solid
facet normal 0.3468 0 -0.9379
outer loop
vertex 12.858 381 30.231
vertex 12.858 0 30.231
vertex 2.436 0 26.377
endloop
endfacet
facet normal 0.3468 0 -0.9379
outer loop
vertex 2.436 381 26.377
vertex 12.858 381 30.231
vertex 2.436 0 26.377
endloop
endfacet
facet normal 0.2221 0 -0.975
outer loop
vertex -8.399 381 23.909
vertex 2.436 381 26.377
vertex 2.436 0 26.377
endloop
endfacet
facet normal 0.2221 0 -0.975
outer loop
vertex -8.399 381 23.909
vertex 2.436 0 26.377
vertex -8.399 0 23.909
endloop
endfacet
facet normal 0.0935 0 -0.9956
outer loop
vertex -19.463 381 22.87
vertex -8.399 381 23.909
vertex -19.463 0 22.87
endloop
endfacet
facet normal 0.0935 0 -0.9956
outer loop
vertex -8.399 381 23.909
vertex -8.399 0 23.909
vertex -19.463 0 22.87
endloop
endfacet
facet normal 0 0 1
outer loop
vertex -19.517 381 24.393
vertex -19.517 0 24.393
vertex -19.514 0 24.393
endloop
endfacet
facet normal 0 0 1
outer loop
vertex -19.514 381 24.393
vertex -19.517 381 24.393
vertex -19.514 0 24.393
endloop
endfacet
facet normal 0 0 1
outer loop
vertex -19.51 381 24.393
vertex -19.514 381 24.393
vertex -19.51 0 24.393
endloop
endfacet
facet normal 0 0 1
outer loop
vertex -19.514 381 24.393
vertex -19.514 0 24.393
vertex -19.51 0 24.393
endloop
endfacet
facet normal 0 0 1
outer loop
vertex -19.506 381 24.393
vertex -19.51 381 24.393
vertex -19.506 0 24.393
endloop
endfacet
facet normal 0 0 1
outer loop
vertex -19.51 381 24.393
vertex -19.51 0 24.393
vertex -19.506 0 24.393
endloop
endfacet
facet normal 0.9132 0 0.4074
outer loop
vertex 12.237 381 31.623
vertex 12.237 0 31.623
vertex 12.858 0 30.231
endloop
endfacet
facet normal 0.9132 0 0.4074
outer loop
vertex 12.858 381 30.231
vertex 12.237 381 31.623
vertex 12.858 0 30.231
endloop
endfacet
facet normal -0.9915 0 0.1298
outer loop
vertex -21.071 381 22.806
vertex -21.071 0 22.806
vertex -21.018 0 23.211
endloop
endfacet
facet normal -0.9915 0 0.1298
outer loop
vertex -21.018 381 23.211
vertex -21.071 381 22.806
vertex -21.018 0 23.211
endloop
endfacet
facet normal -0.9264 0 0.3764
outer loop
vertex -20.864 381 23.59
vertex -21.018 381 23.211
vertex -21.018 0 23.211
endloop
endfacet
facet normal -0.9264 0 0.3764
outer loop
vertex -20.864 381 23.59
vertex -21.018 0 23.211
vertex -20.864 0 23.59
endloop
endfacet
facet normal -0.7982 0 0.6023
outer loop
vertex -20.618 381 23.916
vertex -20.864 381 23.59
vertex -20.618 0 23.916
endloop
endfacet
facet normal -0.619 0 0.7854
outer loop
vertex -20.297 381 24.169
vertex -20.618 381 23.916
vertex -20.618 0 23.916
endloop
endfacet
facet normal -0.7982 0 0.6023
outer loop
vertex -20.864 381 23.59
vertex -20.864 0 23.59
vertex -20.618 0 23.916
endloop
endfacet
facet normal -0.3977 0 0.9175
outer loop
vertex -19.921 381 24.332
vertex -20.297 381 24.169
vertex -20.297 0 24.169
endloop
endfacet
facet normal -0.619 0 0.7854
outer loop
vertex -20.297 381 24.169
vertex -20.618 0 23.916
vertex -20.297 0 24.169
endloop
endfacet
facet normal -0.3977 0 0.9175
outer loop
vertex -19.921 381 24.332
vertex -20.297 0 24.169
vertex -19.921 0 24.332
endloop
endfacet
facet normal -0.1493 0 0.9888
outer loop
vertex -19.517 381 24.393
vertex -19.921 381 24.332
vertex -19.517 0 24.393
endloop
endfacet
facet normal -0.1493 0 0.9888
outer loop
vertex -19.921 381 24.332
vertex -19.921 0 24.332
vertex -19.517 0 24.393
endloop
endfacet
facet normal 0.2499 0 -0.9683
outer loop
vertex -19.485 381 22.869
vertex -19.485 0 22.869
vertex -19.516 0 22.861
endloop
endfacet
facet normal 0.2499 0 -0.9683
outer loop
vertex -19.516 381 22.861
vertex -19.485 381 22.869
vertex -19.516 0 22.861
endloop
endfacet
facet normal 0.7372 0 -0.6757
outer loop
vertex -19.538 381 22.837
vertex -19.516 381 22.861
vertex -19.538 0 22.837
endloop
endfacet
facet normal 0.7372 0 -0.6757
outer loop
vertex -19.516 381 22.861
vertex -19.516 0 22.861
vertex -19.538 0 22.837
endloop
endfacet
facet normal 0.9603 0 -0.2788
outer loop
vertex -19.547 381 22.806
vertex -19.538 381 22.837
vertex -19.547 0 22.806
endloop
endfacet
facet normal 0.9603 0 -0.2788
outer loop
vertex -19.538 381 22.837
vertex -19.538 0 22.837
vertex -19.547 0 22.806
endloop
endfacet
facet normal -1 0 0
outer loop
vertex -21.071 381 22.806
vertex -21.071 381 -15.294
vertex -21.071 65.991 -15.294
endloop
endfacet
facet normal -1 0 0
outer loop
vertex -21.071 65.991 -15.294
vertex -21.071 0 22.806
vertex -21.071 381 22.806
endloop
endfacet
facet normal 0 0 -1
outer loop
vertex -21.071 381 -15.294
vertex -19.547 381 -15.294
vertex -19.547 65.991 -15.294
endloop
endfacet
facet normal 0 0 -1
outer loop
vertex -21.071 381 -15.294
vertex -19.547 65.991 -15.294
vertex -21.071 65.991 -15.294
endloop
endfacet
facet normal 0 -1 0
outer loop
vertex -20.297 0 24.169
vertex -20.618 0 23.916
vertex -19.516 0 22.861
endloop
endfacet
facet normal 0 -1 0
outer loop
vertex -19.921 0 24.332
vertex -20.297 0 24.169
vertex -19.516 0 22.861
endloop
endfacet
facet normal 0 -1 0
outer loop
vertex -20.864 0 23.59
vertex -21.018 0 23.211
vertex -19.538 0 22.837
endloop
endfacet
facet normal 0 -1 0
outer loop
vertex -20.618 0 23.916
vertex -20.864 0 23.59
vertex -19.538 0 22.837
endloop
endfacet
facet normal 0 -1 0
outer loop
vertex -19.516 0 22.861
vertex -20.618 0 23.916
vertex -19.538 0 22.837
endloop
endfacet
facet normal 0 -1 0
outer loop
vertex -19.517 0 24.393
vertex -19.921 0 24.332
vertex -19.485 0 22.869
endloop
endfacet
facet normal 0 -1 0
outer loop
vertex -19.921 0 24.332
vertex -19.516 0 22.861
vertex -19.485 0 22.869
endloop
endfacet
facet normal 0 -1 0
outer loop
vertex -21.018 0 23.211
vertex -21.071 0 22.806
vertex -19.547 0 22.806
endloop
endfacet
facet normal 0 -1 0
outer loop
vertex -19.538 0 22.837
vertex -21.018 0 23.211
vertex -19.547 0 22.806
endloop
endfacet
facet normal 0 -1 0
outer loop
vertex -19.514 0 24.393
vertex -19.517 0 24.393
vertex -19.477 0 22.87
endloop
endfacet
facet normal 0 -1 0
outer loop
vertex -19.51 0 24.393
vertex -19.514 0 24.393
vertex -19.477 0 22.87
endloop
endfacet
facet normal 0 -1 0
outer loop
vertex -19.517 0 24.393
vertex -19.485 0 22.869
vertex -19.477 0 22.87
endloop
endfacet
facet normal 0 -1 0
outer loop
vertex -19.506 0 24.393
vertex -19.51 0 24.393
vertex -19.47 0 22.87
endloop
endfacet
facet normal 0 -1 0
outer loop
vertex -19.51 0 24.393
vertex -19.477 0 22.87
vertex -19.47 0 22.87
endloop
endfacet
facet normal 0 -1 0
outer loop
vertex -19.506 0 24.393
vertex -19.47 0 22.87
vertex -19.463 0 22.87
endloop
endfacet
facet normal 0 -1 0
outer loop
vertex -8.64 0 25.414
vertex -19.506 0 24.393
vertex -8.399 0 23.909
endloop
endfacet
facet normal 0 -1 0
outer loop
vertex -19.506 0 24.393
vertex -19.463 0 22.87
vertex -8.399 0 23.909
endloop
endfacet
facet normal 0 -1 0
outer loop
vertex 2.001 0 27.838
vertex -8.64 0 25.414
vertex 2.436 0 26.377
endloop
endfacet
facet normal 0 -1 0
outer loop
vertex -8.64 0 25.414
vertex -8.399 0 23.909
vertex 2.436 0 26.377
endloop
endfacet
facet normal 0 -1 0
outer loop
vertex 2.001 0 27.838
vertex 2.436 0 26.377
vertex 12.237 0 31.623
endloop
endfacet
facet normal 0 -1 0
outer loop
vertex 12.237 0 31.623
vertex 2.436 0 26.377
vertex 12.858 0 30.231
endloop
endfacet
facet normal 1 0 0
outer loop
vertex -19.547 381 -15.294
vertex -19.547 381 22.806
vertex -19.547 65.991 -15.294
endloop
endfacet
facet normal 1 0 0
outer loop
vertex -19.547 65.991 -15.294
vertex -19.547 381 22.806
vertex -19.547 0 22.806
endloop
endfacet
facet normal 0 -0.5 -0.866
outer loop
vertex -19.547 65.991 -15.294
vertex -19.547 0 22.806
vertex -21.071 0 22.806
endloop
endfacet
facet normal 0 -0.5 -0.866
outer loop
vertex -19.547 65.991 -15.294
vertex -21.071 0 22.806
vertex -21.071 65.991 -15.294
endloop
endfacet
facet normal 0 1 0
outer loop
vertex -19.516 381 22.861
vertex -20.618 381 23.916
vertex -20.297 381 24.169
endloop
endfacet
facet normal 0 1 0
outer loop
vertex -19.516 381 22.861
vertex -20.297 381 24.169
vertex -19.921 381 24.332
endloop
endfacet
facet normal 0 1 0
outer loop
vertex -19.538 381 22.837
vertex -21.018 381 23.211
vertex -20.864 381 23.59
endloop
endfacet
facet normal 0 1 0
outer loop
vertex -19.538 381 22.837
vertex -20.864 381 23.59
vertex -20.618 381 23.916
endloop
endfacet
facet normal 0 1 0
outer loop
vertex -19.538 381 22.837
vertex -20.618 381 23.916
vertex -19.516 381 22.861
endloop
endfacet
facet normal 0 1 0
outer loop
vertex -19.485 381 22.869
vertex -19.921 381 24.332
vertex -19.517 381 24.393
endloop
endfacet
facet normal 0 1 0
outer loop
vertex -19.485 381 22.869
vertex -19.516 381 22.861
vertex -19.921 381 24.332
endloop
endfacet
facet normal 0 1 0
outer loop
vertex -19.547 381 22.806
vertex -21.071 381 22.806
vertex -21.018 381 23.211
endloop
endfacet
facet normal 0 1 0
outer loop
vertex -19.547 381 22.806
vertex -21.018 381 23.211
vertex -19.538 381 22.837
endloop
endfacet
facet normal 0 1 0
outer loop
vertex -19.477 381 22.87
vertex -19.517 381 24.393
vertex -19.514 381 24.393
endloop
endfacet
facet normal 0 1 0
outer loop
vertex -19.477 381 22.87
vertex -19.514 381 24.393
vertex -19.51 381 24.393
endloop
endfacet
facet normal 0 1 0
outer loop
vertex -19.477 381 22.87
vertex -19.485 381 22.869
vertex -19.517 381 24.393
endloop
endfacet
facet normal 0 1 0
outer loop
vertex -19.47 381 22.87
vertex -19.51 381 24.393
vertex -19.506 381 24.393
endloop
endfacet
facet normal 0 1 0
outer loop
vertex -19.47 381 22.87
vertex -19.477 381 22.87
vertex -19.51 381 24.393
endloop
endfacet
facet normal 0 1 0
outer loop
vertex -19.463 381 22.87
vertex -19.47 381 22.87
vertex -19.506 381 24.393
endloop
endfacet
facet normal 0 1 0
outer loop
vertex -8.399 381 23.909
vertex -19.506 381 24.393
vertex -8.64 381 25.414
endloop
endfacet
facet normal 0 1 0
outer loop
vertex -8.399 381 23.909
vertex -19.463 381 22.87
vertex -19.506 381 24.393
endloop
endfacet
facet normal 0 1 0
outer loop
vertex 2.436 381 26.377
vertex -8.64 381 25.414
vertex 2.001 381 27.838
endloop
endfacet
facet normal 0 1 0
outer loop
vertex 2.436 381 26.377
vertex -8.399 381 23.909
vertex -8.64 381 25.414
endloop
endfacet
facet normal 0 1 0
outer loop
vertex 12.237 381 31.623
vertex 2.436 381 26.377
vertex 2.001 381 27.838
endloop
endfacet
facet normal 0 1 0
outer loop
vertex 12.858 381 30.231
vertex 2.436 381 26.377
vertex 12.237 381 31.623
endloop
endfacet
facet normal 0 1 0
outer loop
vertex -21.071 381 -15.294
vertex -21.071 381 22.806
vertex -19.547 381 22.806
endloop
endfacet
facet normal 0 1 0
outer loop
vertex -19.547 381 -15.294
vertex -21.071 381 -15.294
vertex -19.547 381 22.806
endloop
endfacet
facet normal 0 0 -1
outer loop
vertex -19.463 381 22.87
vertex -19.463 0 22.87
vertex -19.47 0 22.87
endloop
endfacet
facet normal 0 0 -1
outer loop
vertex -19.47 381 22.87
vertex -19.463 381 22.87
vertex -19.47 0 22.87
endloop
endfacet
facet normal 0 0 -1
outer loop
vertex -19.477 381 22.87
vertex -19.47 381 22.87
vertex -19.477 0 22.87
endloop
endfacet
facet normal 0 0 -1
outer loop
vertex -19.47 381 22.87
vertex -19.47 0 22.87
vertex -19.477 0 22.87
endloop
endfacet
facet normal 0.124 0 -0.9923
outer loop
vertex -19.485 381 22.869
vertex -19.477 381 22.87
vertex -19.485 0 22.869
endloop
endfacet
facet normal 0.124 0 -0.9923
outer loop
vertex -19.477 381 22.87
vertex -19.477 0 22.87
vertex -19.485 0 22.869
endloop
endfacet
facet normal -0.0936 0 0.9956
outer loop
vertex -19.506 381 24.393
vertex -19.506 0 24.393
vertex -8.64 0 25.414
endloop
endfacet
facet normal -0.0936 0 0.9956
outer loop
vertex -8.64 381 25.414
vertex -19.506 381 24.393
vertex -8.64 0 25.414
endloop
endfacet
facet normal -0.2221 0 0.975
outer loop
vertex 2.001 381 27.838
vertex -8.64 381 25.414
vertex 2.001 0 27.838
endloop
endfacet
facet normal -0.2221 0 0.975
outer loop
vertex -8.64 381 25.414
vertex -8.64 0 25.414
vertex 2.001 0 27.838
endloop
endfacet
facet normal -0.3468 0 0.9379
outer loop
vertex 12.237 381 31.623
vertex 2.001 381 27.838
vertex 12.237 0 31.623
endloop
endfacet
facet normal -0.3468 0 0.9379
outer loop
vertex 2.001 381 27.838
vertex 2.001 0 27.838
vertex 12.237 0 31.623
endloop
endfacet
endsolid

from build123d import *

# Parameters (mm, degrees)
BASE_FLANGE1_DEPTH = 381
CUT_EXTRUDE3_DEPTH = 384.680964443


# Read off the part's stored shape, not the designer's step: Base-Flange1
with BuildPart() as part:
    # Base-Flange1 outline → Base-Flange1 (new body)
    with BuildSketch(Plane(origin=(0, 0, 0), x_dir=(1, 0, 0), z_dir=(0, 1, 0))):
        with BuildLine():
            Line((-19.546720325, -22.80599753), (-19.546720325, 15.29400247))
            Line((-19.546720325, 15.29400247), (-21.070720325, 15.29400247))
            Line((-21.070720325, 15.29400247), (-21.070720325, -22.80599753))
            ThreePointArc((-21.070720325, -22.80599753), (-20.617741894, -23.916410543), (-19.517313006, -24.393131405))
            ThreePointArc((-19.517313006, -24.393131405), (-19.511747403, -24.393260722), (-19.506182287, -24.393409555))
            ThreePointArc((-19.506182287, -24.393409555), (-3.280067744, -26.452317081), (12.23727224, -31.623202224))
            Line((12.23727224, -31.623202224), (12.857840422, -30.231271503))
            ThreePointArc((12.857840422, -30.231271503), (-2.941633017, -24.966370266), (-19.462767824, -22.870028058))
            ThreePointArc((-19.462767824, -22.870028058), (-19.47367545, -22.869736345), (-19.484584032, -22.869482885))
            ThreePointArc((-19.484584032, -22.869482885), (-19.528601188, -22.85041405), (-19.546720325, -22.80599753))
        make_face()
    extrude(amount=BASE_FLANGE1_DEPTH)

    # Sketch5 → Cut-Extrude3 (cut, through all)
    with BuildSketch(Plane(origin=(-19.546720325, 0, 0), x_dir=(0, 0, -1), z_dir=(1, 0, 0))):
        Polygon((-22.80599753, 0), (15.29400247, 65.991135768), (15.29400247, 0), align=None)
    extrude(amount=-CUT_EXTRUDE3_DEPTH, mode=Mode.SUBTRACT)


solid = part.part
